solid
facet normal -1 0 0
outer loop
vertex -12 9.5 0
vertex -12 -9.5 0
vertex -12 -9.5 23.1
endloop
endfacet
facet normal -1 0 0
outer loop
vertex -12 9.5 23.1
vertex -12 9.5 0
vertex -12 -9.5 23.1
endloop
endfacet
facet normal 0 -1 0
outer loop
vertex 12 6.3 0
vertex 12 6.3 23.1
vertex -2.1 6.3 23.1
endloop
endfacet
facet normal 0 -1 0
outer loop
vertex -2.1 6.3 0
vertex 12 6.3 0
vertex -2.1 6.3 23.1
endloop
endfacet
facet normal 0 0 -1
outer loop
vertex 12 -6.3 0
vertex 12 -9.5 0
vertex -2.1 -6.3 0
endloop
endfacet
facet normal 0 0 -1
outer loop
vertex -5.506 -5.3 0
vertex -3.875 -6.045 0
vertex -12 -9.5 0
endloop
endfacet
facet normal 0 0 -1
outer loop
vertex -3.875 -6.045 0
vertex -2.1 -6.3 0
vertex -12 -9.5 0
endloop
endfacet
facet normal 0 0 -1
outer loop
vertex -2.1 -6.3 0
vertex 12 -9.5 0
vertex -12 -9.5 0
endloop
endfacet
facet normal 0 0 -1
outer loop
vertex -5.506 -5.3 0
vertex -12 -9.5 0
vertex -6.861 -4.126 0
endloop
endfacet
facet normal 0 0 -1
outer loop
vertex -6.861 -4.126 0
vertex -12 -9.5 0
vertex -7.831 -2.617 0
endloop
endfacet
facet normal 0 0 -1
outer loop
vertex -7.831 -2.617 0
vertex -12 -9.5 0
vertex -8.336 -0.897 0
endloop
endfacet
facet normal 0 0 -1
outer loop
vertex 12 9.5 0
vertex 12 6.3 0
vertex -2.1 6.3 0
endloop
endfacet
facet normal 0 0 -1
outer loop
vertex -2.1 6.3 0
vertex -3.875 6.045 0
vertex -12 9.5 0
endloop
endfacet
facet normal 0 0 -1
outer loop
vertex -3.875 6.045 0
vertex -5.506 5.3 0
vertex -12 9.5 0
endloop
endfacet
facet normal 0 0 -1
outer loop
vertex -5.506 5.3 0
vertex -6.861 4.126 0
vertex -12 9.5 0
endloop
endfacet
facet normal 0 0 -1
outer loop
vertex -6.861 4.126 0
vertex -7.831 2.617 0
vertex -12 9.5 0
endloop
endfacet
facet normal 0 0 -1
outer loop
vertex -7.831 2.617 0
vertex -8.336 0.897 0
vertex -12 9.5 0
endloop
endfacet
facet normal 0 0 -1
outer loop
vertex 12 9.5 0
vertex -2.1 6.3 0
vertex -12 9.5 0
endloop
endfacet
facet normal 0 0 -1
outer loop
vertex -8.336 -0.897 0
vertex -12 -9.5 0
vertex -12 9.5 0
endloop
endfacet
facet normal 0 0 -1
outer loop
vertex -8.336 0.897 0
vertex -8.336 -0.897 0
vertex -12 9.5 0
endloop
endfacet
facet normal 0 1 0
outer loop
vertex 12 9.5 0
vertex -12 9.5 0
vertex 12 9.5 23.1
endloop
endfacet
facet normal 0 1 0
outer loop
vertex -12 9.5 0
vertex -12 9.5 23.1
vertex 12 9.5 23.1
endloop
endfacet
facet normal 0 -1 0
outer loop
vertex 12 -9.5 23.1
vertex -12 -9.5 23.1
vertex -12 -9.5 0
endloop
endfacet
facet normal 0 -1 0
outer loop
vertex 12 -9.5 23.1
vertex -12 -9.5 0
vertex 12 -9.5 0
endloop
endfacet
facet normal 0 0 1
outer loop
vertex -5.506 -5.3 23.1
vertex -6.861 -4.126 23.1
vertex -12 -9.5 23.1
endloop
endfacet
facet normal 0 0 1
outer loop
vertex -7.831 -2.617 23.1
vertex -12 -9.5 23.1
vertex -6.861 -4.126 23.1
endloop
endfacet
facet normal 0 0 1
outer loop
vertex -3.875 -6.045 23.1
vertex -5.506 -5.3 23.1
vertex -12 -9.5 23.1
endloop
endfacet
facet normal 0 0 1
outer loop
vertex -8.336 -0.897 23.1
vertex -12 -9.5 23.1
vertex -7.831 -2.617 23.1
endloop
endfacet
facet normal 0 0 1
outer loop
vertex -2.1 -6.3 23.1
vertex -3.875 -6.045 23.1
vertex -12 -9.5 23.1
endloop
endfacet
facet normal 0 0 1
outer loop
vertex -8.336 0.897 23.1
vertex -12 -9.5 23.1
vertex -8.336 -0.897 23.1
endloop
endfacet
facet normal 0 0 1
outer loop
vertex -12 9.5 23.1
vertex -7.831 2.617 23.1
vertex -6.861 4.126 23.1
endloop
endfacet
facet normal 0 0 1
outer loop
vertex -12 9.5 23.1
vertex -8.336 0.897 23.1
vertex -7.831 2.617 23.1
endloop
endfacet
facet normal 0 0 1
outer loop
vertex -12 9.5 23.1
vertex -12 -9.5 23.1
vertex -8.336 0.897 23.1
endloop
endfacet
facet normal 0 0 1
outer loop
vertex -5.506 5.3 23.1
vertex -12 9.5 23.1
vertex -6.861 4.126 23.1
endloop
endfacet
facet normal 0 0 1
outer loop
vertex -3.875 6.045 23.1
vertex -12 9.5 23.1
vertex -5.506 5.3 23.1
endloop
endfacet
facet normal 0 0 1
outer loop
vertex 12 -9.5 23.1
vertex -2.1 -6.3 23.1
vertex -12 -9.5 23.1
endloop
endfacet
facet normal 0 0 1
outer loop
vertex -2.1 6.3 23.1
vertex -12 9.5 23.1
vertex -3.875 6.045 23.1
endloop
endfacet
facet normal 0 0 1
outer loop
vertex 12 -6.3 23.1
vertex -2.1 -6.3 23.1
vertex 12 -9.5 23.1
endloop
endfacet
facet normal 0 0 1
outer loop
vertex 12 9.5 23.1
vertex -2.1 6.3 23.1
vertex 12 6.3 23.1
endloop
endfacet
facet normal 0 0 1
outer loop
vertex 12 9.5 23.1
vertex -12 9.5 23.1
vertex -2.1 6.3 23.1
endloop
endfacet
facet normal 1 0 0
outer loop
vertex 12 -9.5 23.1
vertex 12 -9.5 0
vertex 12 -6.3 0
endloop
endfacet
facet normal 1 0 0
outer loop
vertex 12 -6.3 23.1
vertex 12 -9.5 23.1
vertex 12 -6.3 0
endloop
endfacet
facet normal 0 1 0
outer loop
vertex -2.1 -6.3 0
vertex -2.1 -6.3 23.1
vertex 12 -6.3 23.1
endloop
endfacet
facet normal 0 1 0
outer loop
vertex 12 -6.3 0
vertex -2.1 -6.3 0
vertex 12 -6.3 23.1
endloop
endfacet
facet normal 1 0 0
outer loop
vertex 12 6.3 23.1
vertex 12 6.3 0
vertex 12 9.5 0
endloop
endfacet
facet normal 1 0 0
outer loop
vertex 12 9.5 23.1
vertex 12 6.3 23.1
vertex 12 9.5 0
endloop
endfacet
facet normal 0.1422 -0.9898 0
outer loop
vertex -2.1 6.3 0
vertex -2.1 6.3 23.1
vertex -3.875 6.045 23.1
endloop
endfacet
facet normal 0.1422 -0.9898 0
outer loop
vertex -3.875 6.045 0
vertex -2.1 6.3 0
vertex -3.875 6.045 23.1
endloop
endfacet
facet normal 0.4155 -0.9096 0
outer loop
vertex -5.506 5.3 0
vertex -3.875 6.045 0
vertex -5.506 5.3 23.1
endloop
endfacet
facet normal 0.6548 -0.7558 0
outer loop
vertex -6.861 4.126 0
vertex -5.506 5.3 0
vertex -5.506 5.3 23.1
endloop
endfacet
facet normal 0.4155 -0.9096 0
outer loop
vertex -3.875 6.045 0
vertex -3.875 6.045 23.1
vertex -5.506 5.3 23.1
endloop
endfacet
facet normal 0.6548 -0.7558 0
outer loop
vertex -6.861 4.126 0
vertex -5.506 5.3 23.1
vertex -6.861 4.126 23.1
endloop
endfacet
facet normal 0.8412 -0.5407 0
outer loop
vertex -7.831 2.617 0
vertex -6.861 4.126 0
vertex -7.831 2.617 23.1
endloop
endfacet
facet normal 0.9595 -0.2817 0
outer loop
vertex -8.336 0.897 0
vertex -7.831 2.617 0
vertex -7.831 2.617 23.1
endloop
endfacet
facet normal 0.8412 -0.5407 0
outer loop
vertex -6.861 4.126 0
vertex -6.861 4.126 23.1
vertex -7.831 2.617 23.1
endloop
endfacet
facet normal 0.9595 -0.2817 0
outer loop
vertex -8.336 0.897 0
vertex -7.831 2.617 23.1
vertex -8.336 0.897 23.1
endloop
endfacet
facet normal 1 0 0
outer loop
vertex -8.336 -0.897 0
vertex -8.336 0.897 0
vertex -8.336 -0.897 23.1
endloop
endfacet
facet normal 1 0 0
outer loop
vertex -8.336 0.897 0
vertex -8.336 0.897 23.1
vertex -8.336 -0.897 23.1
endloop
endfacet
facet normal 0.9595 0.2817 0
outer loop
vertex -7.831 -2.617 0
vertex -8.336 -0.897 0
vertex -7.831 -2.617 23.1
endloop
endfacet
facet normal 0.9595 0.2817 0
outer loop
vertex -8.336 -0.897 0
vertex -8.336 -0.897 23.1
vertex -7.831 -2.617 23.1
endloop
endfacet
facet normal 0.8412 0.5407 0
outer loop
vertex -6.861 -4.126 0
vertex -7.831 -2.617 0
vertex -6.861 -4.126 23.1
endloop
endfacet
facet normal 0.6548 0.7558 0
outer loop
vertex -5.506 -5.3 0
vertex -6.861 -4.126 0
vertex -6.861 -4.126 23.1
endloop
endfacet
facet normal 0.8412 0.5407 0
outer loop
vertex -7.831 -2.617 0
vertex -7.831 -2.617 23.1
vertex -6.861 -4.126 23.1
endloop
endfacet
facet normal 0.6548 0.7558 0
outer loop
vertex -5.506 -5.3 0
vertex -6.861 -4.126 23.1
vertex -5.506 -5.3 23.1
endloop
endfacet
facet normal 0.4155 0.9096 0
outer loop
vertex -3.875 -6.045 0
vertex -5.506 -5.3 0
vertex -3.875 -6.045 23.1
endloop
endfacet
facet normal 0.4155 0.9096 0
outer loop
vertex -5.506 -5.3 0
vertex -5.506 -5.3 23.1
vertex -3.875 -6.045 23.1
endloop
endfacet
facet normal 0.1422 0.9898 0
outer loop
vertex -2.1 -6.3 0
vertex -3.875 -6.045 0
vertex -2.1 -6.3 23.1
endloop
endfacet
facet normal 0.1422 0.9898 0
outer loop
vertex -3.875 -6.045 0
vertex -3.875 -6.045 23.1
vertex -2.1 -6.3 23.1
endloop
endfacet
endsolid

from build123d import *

# Parameters (mm, degrees)
SKETCH_1_24X19_W         = 19
SKETCH_1_24X19_H         = 24
EXTRUDE_1_33_DEPTH       = 33
CUT_EXTRUDE_2_REACH      = 38.377
CUT_EXTRUDE_4_2_DEPTH    = 1.9
CUT_EXTRUDE_6_3_REACH    = 29.71
SKETCH_7_5_W             = 24
SKETCH_7_5_H             = 19
EXTRUDE_7_DEPTH          = 5
CUT_EXTRUDE_10_4_REACH   = 41.925
SKETCH_11_W              = 8.5
SKETCH_11_H              = 3.1
CUT_EXTRUDE_11_5_DEPTH   = 4.9
SKETCH_11D1_W            = 6
SKETCH_11D1_H            = 3.1
CUT_EXTRUDE_11D1_6_DEPTH = 10
CUT_EXTRUDE_12_9_REACH   = 31.655
CUT_EXTRUDE_11_DEPTH     = 3.5
SKETCH_5903_W            = 53.98
SKETCH_5903_H            = 19
CUT_EXTRUDE_12_DEPTH     = 1
CUT_EXTRUDE_13_DEPTH     = 40.102429623
CUT_EXTRUDE_15_REACH     = 33.036
SKETCH_5021_R            = 3.5
EXTRUDE_2_DEPTH          = 0.4
SKETCH_7445_W            = 0.8
SKETCH_7445_H            = 3.1
EXTRUDE_3_DEPTH          = 19
CUT_EXTRUDE_16_DEPTH     = 32.036269144
SKETCH_14_W              = 24
SKETCH_14_H              = 19
CUT_EXTRUDE_19_DEPTH     = 28.710286942


with BuildPart() as part:
    # 1底部方形_24x19 → 1凸台-拉伸_高33 (new body)
    with BuildSketch(Plane(origin=(0, 0, 0), x_dir=(0, 1, 0), z_dir=(0, 0, 1))):
        Rectangle(SKETCH_1_24X19_W, SKETCH_1_24X19_H)
    extrude(amount=EXTRUDE_1_33_DEPTH)

    # 2吸嘴停靠渐变槽 → 2切除-拉伸 (cut, up to next)
    with BuildSketch(Plane.XY.offset(33), mode=Mode.PRIVATE) as cut_extrude_2_sk1:
        with BuildLine():
            Line((12, -5.1), (12, 5.1))
            Line((12, 5.1), (-1.9, 5.1))
            add(Edge.make_bspline(
                [(-5.213938048, 3.830222216), (-3.829124073, 5.093205317), (-1.9, 5.1)],
                knots=[0, 0, 0, 1, 1, 1], degree=2))
            ThreePointArc((-5.213938048, 3.830222216), (-7, 0), (-5.213938048, -3.830222216))
            add(Edge.make_bspline(
                [(-5.213938048, -3.830222216), (-3.829124073, -5.093205317), (-1.9, -5.1)],
                knots=[0, 0, 0, 1, 1, 1], degree=2))
            Line((-1.9, -5.1), (12, -5.1))
        make_face()
    cut_extrude_2_tool1 = extrude(cut_extrude_2_sk1.sketch, amount=-CUT_EXTRUDE_2_REACH, mode=Mode.PRIVATE) & part.part
    add(cut_extrude_2_tool1.solids().sort_by_distance((3.017719, 0, 33))[0], mode=Mode.SUBTRACT)

    # 4反光板停靠槽 → 4切除-拉伸2 (cut)
    with BuildSketch(Plane.XY.offset(25)):
        with BuildLine():
            Line((-0.7, 8.4), (12, 8.4))
            Line((12, 8.4), (12, -8.4))
            Line((12, -8.4), (-0.7, -8.4))
            ThreePointArc((-0.7, -8.4), (-10.5, 0), (-0.7, 8.4))
        make_face()
    extrude(amount=-CUT_EXTRUDE_4_2_DEPTH, mode=Mode.SUBTRACT)

    # 6反光板小圆柱 → 6切除-拉伸3 (cut, up to next)
    with BuildSketch(Plane.XY.offset(23.1), mode=Mode.PRIVATE) as cut_extrude_6_3_sk1:
        with BuildLine():
            Line((-2.1, -6.3), (12, -6.3))
            Line((12, -6.3), (12, 6.3))
            Line((12, 6.3), (-2.1, 6.3))
            ThreePointArc((-2.1, 6.3), (-8.4, 0), (-2.1, -6.3))
        make_face()
    cut_extrude_6_3_tool1 = extrude(cut_extrude_6_3_sk1.sketch, amount=-CUT_EXTRUDE_6_3_REACH, mode=Mode.PRIVATE) & part.part
    add(cut_extrude_6_3_tool1.solids().sort_by_distance((2.424095, 0, 23.1))[0], mode=Mode.SUBTRACT)

    # 7草图5 → 7凸台-拉伸_底板厚度 (add)
    with BuildSketch(Plane(origin=(0, 0, 0), x_dir=(1, 0, 0), z_dir=(0, 0, -1))):
        Rectangle(SKETCH_7_5_W, SKETCH_7_5_H)
    extrude(amount=-EXTRUDE_7_DEPTH)

    # 10切除-拉伸4: up to this face of the body (flat: up to its plane)
    cut_extrude_10_4_end = Plane(part.part.faces().sort_by_distance((0, -9.5, 16.5))[0])
    # Sketch 10 → 10切除-拉伸4 (cut, up to the picked face)
    with BuildSketch(Plane(origin=(0, 9.5, 0), x_dir=(-1, 0, 0), z_dir=(0, 1, 0)), mode=Mode.PRIVATE) as cut_extrude_10_4_sk1:
        Polygon((-12, 31.162738066), (-12, 33), (9, 33), align=None)
    cut_extrude_10_4_tool1 = split(extrude(cut_extrude_10_4_sk1.sketch, amount=-CUT_EXTRUDE_10_4_REACH, mode=Mode.PRIVATE), bisect_by=cut_extrude_10_4_end, keep=Keep.BOTH, mode=Mode.PRIVATE)
    add(cut_extrude_10_4_tool1.solids().sort_by(Axis((5, 9.5, 32.387579), (0, -1, 0)))[0], mode=Mode.SUBTRACT)

    # Sketch 11 → 11切除-拉伸5 (cut)
    with BuildSketch(Plane(origin=(-12, 0, 0), x_dir=(0, -1, 0), z_dir=(-1, 0, 0))):
        with Locations((-5.25, 26.95)):
            Rectangle(SKETCH_11_W, SKETCH_11_H)
        with Locations((5.25, 26.95)):
            Rectangle(SKETCH_11_W, SKETCH_11_H)
    extrude(amount=-CUT_EXTRUDE_11_5_DEPTH, mode=Mode.SUBTRACT)

    # 11d1_磁铁开窗 → 11d1切除-拉伸6 (cut)
    with BuildSketch(Plane(origin=(-12, 0, 0), x_dir=(0, -1, 0), z_dir=(-1, 0, 0))):
        with Locations((0, 26.95)):
            Rectangle(SKETCH_11D1_W, SKETCH_11D1_H)
    extrude(amount=-CUT_EXTRUDE_11D1_6_DEPTH, mode=Mode.SUBTRACT)

    # 12切除薄壁 → 12切除-拉伸9 (cut, up to next)
    with BuildSketch(Plane.XY.offset(25.4), mode=Mode.PRIVATE) as cut_extrude_12_9_sk1:
        with BuildLine():
            Line((-0.7, 8.4), (-0.7, -8.4))
            ThreePointArc((-0.7, -8.4), (-10.5, 0), (-0.7, 8.4))
        make_face()
    cut_extrude_12_9_tool1 = extrude(cut_extrude_12_9_sk1.sketch, amount=-CUT_EXTRUDE_12_9_REACH, mode=Mode.PRIVATE) & part.part
    add(cut_extrude_12_9_tool1.solids().sort_by_distance((-4.916056, 0, 25.4))[0], mode=Mode.SUBTRACT)

    # Sketch 5393 → 切除-拉伸11 (cut)
    with BuildSketch(Plane.XY.offset(33)):
        with BuildLine():
            Line((-2.099999748, 6.5), (12, 6.5))
            Line((12, 6.5), (12, -6.5))
            Line((12, -6.5), (-2.099999748, -6.5))
            ThreePointArc((-2.099999748, -6.5), (-8.6, 0), (-2.099999748, 6.5))
        make_face()
    extrude(amount=-CUT_EXTRUDE_11_DEPTH, mode=Mode.SUBTRACT)

    # Sketch 5903 → 切除-拉伸12 (cut)
    with BuildSketch(Plane.XY.offset(33)):
        with Locations((14.99, 0)):
            Rectangle(SKETCH_5903_W, SKETCH_5903_H)
    extrude(amount=-CUT_EXTRUDE_12_DEPTH, mode=Mode.SUBTRACT)

    # Sketch 6208 → 切除-拉伸13 (cut, through all)
    with BuildSketch(Plane.XZ.offset(9.5)):
        Polygon((2.430052303, 32), (12, 31.162738066), (12, 28.826114347), (-6, 32), align=None)
    extrude(amount=-CUT_EXTRUDE_13_DEPTH, mode=Mode.SUBTRACT)

    # Sketch 5021 → 切除-拉伸15 (cut, up to next)
    with BuildSketch(Plane.XY.offset(5), mode=Mode.PRIVATE) as cut_extrude_15_sk1:
        with Locations((2, 0)):
            Circle(SKETCH_5021_R)
    cut_extrude_15_tool1 = extrude(cut_extrude_15_sk1.sketch, amount=-CUT_EXTRUDE_15_REACH, mode=Mode.PRIVATE) & part.part
    add(cut_extrude_15_tool1.solids().sort_by_distance((2, 0, 5))[0], mode=Mode.SUBTRACT)

    # Sketch 6983 → 凸台-拉伸2 (add)
    with BuildSketch(Plane(origin=(0, 0, 25.4), x_dir=(1, 0, 0), z_dir=(0, 0, -1))):
        with BuildLine():
            Line((-7.1, -3), (-7.1, -6.8))
            ThreePointArc((-7.1, -6.8), (-4.061552813, -8.246211251), (-0.7, -8.4))
            Line((-0.7, -8.4), (-0.7, -5.1))
            Line((-0.7, -5.1), (-1.9, -5.1))
            add(Edge.make_bspline(
                [(-1.9, -5.1), (-3.829124073, -5.093205317), (-5.213938048, -3.830222216)],
                knots=[0, 0, 0, 1, 1, 1], degree=2))
            ThreePointArc((-5.213938048, -3.830222216), (-5.630777158, -3.437652866), (-6, -3))
            Line((-6, -3), (-7.1, -3))
        make_face()
        with BuildLine():
            Line((-7.1, 3), (-6, 3))
            ThreePointArc((-6, 3), (-5.630777158, 3.437652866), (-5.213938048, 3.830222216))
            add(Edge.make_bspline(
                [(-5.213938048, 3.830222216), (-3.829124073, 5.093205317), (-1.9, 5.1)],
                knots=[0, 0, 0, 1, 1, 1], degree=2))
            Line((-1.9, 5.1), (-0.7, 5.1))
            Line((-0.7, 5.1), (-0.7, 8.4))
            ThreePointArc((-0.7, 8.4), (-4.061552813, 8.246211251), (-7.1, 6.8))
            Line((-7.1, 6.8), (-7.1, 3))
        make_face()
    extrude(amount=EXTRUDE_2_DEPTH)

    # Sketch 7445 → 凸台-拉伸3 (add)
    with BuildSketch(Plane.XZ.offset(9.5)):
        with Locations((-11.6, 26.95)):
            Rectangle(SKETCH_7445_W, SKETCH_7445_H)
    extrude(amount=-EXTRUDE_3_DEPTH)

    # 草图13 → 切除-拉伸16 (cut, through all)
    with BuildSketch(Plane.XY.offset(5)):
        with BuildLine():
            Line((-2.1, -6.3), (12, -6.3))
            Line((12, -6.3), (12, 6.3))
            Line((12, 6.3), (-2.1, 6.3))
            ThreePointArc((-2.1, 6.3), (-8.4, 0), (-2.1, -6.3))
        make_face()
    extrude(amount=-CUT_EXTRUDE_16_DEPTH, mode=Mode.SUBTRACT)

    # 草图14 → 切除-拉伸19 (cut, through all)
    with BuildSketch(Plane.XY.offset(23.1)):
        Rectangle(SKETCH_14_W, SKETCH_14_H)
    extrude(amount=CUT_EXTRUDE_19_DEPTH, mode=Mode.SUBTRACT)


solid = part.part
